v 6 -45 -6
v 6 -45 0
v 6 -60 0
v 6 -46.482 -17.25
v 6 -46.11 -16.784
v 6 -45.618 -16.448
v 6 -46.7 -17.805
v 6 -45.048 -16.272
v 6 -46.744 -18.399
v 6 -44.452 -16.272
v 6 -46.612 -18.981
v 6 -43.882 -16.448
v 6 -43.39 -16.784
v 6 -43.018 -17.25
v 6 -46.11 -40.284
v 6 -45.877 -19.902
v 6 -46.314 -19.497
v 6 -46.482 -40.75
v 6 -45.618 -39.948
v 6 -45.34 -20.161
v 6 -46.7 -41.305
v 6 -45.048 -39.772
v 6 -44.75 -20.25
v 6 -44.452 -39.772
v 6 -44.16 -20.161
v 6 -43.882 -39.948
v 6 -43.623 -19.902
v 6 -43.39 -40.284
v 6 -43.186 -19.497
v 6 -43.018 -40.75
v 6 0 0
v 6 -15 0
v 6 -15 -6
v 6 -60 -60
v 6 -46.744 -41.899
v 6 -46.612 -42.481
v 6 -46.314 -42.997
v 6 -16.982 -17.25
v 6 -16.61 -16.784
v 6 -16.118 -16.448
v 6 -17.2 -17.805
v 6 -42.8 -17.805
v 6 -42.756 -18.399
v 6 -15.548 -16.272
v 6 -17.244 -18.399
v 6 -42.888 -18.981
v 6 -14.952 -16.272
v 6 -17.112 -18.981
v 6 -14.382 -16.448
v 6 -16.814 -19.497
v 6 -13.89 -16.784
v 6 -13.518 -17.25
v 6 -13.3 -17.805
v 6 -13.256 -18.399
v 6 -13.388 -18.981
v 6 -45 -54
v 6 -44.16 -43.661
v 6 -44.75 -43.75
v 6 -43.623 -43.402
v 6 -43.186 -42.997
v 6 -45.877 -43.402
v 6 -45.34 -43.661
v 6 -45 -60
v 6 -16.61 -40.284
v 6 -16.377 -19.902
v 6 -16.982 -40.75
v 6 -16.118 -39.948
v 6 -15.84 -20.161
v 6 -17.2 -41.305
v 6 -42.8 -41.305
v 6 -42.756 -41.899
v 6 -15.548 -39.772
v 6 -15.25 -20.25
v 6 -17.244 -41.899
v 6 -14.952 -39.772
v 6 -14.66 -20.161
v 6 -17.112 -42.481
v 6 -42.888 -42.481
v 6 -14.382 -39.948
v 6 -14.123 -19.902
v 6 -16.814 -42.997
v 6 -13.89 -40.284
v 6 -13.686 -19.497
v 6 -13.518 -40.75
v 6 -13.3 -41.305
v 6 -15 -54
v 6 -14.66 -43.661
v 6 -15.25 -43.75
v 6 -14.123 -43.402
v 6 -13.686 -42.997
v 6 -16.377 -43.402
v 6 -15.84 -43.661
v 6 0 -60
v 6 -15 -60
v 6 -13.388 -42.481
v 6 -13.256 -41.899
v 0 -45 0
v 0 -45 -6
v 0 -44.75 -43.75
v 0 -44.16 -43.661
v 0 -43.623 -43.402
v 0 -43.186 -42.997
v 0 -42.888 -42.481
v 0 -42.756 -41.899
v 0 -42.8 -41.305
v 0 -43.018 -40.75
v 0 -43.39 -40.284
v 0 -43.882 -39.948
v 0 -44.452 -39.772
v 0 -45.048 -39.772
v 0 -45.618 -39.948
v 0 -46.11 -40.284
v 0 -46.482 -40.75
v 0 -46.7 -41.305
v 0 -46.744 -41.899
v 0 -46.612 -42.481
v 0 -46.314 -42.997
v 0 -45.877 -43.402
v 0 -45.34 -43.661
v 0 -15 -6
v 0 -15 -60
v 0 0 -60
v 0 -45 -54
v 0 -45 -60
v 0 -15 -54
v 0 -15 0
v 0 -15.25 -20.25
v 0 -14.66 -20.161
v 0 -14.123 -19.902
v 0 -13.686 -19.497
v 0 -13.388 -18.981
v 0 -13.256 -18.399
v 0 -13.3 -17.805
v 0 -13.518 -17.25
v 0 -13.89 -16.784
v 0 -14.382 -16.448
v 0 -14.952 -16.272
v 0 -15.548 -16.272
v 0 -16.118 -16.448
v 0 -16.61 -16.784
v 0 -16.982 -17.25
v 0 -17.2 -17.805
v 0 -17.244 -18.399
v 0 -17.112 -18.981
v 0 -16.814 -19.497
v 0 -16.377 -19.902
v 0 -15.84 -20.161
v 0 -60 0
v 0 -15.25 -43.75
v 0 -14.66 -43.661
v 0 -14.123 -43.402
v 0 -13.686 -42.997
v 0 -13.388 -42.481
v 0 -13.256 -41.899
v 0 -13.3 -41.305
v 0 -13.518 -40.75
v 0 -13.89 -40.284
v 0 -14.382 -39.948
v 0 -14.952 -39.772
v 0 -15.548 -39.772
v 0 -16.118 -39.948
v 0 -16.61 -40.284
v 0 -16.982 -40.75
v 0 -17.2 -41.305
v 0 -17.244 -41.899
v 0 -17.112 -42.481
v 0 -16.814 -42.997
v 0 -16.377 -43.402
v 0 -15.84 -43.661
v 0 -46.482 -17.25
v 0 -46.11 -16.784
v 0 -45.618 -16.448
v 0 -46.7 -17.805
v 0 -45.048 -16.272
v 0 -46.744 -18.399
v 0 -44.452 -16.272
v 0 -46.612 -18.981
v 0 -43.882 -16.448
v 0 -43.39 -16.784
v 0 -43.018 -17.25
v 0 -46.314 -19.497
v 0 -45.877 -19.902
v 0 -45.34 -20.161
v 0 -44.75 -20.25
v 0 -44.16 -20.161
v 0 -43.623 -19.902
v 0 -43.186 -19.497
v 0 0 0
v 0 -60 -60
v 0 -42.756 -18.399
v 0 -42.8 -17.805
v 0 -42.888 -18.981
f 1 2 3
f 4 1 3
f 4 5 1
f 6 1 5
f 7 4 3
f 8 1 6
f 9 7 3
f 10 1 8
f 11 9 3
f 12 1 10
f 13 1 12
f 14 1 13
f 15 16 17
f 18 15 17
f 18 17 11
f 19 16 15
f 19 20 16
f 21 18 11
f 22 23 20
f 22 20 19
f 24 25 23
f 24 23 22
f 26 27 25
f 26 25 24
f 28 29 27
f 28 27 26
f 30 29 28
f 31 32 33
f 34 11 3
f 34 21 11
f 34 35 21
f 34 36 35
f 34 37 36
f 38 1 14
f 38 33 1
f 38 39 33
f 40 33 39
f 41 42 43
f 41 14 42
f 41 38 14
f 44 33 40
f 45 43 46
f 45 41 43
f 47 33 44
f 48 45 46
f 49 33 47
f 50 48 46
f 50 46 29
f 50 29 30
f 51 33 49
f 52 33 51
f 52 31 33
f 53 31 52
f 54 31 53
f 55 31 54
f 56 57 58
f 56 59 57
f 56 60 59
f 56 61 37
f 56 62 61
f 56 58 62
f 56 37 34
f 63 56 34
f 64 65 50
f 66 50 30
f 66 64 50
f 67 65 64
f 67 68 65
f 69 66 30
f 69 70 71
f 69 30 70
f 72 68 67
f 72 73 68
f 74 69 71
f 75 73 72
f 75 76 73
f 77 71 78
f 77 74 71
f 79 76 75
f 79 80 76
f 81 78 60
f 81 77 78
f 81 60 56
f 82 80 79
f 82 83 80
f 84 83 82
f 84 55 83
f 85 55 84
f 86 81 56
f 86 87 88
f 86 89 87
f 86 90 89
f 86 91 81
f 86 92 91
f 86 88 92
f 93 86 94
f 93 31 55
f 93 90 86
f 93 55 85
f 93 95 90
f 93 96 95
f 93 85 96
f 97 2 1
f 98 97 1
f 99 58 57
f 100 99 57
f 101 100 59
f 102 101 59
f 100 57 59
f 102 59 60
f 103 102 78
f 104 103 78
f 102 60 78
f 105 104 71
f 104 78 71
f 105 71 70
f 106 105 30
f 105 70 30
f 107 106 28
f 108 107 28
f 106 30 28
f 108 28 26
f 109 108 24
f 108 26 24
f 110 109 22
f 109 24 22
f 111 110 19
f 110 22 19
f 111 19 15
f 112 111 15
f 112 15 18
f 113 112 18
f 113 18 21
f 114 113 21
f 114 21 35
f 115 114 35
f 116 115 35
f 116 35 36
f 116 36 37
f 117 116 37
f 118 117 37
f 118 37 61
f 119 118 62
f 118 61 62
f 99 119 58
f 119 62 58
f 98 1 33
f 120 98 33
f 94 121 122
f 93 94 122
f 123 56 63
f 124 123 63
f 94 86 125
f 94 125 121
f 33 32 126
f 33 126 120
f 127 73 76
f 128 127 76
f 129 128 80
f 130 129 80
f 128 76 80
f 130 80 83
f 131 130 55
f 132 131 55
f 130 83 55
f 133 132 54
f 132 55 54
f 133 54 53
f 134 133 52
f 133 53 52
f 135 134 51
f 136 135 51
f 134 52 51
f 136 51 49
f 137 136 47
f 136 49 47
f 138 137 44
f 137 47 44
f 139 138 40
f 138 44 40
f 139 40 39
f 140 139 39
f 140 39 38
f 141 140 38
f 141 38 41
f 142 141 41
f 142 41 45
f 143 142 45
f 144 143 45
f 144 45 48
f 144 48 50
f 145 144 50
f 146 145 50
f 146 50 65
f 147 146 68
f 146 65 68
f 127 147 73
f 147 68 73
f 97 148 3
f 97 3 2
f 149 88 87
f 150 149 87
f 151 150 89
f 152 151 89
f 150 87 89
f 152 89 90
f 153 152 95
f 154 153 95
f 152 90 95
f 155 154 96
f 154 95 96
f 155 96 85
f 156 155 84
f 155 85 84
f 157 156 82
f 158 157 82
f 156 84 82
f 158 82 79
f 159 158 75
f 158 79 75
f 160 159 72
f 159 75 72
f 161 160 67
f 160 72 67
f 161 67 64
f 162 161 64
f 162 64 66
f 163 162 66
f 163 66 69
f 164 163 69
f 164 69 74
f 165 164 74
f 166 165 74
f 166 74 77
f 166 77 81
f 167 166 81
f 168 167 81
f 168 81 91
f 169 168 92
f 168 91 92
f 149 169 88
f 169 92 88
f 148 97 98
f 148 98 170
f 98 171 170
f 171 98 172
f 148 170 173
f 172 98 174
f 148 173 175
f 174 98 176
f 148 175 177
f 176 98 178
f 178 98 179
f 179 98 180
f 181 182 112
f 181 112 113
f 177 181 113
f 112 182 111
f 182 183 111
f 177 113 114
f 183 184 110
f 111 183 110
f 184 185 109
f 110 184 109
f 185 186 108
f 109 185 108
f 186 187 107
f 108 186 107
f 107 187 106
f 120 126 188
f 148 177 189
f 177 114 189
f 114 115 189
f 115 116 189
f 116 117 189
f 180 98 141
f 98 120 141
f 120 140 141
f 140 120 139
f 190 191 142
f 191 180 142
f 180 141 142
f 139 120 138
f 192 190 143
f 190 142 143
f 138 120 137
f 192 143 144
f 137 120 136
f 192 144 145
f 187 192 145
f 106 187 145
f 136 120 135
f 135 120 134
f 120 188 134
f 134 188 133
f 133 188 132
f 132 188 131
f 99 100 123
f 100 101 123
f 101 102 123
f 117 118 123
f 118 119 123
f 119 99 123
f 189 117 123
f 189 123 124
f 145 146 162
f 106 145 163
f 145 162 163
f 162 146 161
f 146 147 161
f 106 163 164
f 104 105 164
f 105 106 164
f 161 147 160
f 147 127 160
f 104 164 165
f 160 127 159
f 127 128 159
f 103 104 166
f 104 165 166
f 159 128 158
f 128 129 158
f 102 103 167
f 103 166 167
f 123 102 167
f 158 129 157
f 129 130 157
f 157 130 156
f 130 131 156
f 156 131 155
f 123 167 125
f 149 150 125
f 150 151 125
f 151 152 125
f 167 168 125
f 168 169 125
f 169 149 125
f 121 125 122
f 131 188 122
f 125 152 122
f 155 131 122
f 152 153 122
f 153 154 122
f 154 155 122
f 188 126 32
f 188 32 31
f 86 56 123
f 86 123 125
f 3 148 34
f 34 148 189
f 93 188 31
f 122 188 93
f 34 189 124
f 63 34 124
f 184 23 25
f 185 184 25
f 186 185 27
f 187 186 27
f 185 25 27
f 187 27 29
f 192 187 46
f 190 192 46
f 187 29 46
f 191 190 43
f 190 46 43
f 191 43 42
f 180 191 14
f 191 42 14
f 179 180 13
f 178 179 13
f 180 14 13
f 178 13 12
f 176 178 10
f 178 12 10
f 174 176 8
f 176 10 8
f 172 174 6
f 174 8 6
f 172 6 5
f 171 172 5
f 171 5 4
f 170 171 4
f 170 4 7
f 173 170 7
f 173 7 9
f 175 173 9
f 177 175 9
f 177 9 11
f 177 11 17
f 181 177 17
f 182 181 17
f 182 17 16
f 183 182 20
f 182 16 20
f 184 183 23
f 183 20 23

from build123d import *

# Parameters (mm, degrees)
SKETCH1_W           = 60
SKETCH1_H           = 60
BOSS_EXTRUDE1_DEPTH = 6
SKETCH2_W           = 6
SKETCH2_H           = 30
CUT_EXTRUDE1_DEPTH  = 6
SKETCH3_R           = 2
CUT_EXTRUDE2_DEPTH  = 6


with BuildPart() as part:
    # Sketch1 → Boss-Extrude1 (new body)
    with BuildSketch(Plane(origin=(0, 0, 0), x_dir=(0, 0, -1), z_dir=(1, 0, 0))):
        with Locations((30, -30)):
            Rectangle(SKETCH1_W, SKETCH1_H)
    extrude(amount=BOSS_EXTRUDE1_DEPTH)

    # Sketch2 → Cut-Extrude1 (cut)
    with BuildSketch(Plane(origin=(6, 0, 0), x_dir=(0, 0, -1), z_dir=(1, 0, 0))):
        with Locations((3, -30)):
            Rectangle(SKETCH2_W, SKETCH2_H)
        with Locations((57, -30)):
            Rectangle(SKETCH2_W, SKETCH2_H)
    extrude(amount=-CUT_EXTRUDE1_DEPTH, mode=Mode.SUBTRACT)

    # Sketch3 → Cut-Extrude2 (cut)
    with BuildSketch(Plane(origin=(6, 0, 0), x_dir=(0, 0, -1), z_dir=(1, 0, 0))):
        with Locations((18.25, -15.25)):
            Circle(SKETCH3_R)
        with Locations((41.75, -15.25)):
            Circle(SKETCH3_R)
        with Locations((41.75, -44.75)):
            Circle(SKETCH3_R)
        with Locations((18.25, -44.75)):
            Circle(SKETCH3_R)
    extrude(amount=-CUT_EXTRUDE2_DEPTH, mode=Mode.SUBTRACT)


solid = part.part
